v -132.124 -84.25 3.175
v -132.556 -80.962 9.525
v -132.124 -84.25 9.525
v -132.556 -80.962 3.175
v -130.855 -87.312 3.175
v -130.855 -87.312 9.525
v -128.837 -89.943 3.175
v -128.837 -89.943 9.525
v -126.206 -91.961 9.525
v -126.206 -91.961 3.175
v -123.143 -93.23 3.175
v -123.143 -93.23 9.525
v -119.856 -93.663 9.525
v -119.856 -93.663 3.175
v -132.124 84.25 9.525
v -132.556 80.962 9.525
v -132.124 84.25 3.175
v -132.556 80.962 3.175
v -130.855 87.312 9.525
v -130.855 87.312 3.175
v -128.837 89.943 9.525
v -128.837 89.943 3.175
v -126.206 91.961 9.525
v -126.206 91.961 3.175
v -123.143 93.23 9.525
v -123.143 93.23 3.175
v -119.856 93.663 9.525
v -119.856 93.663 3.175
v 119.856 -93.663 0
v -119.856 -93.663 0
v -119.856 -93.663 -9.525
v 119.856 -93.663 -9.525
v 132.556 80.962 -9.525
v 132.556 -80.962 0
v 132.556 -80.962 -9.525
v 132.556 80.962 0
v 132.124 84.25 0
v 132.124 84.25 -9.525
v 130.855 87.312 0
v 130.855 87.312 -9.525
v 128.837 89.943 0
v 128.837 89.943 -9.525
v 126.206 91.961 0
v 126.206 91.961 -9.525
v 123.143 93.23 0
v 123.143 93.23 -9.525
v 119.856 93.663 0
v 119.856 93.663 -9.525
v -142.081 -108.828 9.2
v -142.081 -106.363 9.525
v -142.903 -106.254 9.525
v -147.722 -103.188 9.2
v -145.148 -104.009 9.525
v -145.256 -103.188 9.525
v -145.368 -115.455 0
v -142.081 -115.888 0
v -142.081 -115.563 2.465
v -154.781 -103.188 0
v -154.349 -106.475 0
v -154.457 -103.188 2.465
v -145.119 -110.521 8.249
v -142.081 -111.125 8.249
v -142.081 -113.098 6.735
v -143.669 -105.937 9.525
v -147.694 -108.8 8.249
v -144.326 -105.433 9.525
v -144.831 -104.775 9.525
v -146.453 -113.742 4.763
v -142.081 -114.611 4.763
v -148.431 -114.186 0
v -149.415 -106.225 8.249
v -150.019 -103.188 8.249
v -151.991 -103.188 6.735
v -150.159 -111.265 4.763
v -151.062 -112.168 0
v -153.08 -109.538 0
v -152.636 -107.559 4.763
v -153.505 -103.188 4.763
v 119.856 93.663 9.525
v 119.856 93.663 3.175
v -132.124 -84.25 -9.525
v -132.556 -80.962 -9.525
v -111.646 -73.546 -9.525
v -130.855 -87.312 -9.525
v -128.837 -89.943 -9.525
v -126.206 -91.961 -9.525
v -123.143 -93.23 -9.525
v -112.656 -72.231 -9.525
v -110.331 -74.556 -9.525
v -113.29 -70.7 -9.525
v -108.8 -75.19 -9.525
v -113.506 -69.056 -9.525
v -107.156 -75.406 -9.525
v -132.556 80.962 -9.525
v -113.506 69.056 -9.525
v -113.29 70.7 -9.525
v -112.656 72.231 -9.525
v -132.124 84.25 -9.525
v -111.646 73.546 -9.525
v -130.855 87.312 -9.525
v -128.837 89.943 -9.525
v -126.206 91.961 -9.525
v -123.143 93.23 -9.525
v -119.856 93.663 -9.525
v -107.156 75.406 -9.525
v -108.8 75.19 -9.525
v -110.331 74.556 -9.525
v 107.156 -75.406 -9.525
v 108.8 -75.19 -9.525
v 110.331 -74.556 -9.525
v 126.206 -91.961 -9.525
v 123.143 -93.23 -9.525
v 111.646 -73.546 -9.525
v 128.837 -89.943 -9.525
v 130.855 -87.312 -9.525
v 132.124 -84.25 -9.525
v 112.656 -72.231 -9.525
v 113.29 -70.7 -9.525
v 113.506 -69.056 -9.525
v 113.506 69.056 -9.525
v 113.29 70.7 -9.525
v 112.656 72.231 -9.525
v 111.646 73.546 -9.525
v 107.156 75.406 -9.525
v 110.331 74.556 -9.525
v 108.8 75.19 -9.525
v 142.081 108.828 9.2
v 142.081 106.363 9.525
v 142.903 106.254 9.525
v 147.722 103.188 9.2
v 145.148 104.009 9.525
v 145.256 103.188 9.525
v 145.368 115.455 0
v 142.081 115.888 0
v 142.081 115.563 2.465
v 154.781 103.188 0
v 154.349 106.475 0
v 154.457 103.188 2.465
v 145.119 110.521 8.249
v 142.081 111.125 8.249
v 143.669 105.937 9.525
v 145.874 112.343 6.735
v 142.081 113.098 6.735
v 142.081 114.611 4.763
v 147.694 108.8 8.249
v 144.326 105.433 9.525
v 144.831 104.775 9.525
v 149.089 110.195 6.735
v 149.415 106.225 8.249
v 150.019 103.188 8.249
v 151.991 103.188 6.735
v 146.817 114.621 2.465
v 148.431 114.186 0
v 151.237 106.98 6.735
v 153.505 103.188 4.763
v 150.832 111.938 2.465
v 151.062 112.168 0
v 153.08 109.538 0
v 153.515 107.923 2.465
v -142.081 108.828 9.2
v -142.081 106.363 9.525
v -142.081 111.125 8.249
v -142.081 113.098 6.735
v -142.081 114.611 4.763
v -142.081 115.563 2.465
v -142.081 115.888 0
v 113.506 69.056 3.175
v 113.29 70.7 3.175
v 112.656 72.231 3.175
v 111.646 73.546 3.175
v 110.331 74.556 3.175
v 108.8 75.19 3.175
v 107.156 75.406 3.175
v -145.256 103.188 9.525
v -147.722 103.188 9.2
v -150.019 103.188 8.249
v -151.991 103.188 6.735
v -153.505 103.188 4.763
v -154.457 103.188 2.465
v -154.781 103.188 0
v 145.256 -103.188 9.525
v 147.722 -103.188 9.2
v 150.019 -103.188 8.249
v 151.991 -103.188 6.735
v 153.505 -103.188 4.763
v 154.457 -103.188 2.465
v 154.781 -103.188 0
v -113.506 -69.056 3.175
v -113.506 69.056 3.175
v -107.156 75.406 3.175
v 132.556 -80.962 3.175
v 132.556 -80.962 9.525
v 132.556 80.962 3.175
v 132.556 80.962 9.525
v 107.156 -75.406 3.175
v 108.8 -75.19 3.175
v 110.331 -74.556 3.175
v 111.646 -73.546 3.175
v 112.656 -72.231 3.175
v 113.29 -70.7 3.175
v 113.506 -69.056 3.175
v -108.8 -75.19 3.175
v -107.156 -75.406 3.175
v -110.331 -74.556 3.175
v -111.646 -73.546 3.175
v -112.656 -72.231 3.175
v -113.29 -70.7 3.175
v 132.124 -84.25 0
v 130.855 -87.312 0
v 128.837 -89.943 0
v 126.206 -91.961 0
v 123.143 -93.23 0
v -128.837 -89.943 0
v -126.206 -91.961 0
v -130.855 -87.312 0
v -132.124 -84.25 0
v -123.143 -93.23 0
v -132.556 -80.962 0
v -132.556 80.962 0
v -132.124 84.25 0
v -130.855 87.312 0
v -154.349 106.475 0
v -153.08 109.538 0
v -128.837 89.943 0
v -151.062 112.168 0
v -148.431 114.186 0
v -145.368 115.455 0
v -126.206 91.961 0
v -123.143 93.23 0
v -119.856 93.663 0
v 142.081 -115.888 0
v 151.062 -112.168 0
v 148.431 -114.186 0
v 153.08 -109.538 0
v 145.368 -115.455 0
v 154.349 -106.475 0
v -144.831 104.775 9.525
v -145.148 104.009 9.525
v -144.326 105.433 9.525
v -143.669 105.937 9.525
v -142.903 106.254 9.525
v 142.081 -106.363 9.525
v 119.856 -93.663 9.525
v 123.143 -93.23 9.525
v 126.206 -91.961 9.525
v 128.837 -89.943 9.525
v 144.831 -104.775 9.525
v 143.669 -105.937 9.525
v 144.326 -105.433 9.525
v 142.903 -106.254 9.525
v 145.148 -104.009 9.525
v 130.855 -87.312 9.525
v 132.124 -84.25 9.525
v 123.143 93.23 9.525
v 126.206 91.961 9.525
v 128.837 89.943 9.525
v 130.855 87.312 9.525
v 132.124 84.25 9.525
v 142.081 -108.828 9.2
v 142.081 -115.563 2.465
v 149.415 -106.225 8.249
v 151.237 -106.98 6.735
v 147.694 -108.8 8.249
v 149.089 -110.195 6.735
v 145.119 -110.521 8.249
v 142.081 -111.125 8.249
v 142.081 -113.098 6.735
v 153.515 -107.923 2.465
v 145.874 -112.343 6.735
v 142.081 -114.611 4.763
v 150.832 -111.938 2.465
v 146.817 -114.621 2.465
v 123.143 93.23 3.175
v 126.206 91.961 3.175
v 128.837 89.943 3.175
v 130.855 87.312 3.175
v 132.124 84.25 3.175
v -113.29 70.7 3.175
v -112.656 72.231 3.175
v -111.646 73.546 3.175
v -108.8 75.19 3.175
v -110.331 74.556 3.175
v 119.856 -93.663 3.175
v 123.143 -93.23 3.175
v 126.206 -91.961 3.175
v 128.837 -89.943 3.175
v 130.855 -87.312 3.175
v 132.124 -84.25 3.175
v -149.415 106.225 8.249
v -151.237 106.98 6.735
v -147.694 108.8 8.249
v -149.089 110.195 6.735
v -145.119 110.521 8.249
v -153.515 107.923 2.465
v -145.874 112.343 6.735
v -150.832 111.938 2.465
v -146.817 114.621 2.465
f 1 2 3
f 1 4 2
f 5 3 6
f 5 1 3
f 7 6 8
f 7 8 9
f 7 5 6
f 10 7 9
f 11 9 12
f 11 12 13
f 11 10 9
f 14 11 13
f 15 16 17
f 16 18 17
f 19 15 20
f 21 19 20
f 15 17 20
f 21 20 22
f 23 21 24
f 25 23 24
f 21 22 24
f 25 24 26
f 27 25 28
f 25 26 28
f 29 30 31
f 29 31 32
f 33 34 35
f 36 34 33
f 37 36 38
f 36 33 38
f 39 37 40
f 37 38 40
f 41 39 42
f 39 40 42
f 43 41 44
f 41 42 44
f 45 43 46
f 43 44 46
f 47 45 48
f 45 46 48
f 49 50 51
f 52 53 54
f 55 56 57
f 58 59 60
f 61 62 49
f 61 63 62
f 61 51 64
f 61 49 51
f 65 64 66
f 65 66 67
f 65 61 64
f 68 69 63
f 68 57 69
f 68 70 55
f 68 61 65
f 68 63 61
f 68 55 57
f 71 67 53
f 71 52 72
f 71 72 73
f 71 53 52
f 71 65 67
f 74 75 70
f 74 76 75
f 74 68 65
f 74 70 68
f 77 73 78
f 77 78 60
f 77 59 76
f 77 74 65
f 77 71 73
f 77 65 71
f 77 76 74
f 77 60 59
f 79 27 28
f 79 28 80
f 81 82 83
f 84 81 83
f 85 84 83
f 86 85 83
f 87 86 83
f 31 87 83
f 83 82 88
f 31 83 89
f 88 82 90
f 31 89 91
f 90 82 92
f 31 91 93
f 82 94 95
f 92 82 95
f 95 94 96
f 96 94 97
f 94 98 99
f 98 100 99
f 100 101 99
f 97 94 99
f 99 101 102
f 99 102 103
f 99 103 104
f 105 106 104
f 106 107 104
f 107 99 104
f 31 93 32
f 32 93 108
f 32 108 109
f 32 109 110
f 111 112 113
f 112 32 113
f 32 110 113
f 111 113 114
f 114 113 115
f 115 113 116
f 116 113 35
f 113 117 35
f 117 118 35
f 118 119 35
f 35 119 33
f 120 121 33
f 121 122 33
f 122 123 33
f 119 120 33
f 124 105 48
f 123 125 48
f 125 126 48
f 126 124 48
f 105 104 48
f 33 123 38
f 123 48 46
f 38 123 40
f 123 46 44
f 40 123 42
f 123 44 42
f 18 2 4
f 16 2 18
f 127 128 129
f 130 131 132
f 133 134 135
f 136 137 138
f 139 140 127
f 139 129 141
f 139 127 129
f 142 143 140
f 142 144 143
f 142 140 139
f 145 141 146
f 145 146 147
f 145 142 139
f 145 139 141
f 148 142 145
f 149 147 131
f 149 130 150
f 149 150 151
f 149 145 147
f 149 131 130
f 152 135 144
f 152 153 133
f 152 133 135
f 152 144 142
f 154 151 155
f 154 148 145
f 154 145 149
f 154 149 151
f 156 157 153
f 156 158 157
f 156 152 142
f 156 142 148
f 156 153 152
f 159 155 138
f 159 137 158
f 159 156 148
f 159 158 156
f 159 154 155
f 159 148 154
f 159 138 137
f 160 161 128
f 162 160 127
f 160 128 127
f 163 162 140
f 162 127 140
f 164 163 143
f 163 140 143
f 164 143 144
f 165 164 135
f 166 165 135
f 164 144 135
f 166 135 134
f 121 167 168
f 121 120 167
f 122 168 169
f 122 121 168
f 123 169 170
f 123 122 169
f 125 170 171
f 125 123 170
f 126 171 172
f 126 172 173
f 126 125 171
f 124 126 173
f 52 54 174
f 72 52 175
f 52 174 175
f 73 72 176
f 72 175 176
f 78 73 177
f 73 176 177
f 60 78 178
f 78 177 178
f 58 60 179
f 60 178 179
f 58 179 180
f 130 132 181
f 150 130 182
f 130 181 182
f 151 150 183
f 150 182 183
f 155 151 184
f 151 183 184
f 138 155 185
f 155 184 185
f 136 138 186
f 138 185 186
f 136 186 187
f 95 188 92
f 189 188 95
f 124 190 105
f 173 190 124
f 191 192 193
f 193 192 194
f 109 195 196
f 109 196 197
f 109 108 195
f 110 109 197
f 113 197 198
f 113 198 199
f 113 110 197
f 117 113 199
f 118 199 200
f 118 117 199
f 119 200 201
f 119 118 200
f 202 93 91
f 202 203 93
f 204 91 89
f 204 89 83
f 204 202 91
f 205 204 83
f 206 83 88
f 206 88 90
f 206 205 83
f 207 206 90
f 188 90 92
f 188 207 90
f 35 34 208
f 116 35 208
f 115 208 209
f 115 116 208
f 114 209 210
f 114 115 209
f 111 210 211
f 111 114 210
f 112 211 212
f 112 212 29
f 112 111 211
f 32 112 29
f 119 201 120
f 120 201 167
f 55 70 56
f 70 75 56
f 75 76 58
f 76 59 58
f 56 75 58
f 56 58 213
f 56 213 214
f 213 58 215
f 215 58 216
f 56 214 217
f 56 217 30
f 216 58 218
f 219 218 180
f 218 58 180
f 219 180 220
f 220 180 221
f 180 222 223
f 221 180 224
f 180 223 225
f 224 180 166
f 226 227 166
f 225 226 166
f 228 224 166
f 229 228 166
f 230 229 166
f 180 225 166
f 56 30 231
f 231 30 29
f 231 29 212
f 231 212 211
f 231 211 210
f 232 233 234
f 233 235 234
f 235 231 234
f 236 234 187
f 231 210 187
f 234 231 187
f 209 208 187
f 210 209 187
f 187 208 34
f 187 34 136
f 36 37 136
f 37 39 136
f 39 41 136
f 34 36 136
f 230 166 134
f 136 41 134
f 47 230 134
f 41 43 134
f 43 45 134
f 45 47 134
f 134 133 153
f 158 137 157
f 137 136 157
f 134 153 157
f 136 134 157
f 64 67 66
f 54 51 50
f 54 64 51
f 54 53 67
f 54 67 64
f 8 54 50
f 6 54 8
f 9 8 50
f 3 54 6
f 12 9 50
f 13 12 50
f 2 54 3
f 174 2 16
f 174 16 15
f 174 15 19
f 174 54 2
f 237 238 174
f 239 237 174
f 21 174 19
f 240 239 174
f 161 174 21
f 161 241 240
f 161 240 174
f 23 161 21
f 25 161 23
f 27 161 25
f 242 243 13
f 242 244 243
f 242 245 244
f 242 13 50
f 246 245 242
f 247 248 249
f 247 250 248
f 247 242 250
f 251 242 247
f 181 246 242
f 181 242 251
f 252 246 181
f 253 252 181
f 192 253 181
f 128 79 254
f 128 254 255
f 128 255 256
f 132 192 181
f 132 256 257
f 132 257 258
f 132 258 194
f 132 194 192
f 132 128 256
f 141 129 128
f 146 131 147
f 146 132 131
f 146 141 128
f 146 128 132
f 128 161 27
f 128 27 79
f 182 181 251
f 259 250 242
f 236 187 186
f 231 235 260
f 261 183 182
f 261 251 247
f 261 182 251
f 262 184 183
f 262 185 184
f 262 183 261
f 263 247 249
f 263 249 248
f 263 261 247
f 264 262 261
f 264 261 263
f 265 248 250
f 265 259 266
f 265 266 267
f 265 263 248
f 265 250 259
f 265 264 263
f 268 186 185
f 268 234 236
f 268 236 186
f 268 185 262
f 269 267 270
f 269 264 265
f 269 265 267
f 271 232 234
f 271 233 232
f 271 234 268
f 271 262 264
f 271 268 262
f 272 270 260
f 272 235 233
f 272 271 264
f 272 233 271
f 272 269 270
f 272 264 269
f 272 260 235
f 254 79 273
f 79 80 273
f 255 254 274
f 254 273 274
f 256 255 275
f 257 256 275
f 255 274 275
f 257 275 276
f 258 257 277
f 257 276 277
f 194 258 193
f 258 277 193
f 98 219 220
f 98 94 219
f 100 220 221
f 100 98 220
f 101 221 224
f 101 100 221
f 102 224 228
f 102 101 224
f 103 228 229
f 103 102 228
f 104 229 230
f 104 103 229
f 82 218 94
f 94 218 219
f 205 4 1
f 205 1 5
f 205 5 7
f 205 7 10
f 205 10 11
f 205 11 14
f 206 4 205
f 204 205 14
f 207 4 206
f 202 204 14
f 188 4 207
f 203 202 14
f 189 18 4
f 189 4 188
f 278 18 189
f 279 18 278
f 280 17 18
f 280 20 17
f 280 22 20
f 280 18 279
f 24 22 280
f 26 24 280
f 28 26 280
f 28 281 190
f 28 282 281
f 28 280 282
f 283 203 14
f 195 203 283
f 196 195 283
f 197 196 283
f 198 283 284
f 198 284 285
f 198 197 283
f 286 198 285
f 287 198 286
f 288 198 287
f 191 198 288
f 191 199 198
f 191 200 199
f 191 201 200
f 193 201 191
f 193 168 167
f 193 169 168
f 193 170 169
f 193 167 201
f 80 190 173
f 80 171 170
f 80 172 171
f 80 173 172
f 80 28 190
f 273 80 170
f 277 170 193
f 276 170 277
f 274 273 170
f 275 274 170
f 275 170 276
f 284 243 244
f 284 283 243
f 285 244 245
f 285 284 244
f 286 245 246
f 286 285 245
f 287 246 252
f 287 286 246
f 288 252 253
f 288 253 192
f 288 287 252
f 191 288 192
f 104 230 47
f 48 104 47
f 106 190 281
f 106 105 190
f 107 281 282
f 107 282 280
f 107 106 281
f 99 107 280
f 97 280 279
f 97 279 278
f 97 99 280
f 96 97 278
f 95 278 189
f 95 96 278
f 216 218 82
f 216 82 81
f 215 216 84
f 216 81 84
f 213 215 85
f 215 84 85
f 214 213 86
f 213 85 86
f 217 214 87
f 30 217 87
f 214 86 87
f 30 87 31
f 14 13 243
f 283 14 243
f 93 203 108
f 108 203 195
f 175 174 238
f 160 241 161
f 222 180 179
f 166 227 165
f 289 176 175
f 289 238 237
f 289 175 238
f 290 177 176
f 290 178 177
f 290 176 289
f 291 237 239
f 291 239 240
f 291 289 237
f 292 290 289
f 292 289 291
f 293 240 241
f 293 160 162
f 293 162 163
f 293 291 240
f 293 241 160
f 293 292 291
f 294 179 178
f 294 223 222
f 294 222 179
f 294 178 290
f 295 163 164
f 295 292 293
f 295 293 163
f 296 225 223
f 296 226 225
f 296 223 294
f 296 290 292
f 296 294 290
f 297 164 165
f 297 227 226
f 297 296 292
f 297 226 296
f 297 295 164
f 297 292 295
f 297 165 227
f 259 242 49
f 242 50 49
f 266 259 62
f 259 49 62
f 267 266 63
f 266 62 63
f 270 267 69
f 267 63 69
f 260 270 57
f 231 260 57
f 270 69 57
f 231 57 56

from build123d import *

# Parameters (mm, degrees)
SKETCH1_W           = 309.5625
SKETCH1_H           = 231.775
SKETCH1_W_2         = 265.1125
SKETCH1_H_2         = 187.325
SKETCH1_W_3         = 227.0125
SKETCH1_H_3         = 150.8125
BOSS_EXTRUDE1_DEPTH = 9.525
SKETCH1_3_W         = 265.1125
SKETCH1_3_H         = 187.325
SKETCH1_3_W_2       = 227.0125
SKETCH1_3_H_2       = 150.8125
BOSS_EXTRUDE2_DEPTH = 9.525
FILLET1_R           = 12.7
CUT_EXTRUDE1_START  = 9.525
SKETCH1_4_W         = 265.1125
SKETCH1_4_H         = 187.325
SKETCH1_4_W_2       = 227.0125
SKETCH1_4_H_2       = 150.8125
CUT_EXTRUDE1_DEPTH  = 6.35
FILLET2_R           = 6.35
FILLET3_R           = 12.7
FILLET4_R           = 9.525


with BuildPart() as part:
    # Sketch1 → Boss-Extrude1 (new body)
    # profile 1 of 2: a face of its own
    with BuildSketch(Plane.XY):
        Rectangle(SKETCH1_W, SKETCH1_H)
        Rectangle(SKETCH1_W_2, SKETCH1_H_2, mode=Mode.SUBTRACT)
    # profile 2 of 2: a face of its own
    with BuildSketch(Plane.XY):
        Rectangle(SKETCH1_W_2, SKETCH1_H_2)
        Rectangle(SKETCH1_W_3, SKETCH1_H_3, mode=Mode.SUBTRACT)
    extrude(amount=BOSS_EXTRUDE1_DEPTH)

    # Sketch1<3> → Boss-Extrude2 (add)
    with BuildSketch(Plane.XY):
        Rectangle(SKETCH1_3_W, SKETCH1_3_H)
        Rectangle(SKETCH1_3_W_2, SKETCH1_3_H_2, mode=Mode.SUBTRACT)
    extrude(amount=-BOSS_EXTRUDE2_DEPTH)

    # Fillet1
    fillet1_edges = [part.edges().sort_by_distance(p)[0] for p in [
        (-154.78125, -115.8875, 4.7625),
        (-154.78125, 115.8875, 4.7625),
        (154.78125, 115.8875, 4.7625),
        (154.78125, -115.8875, 4.7625),
        (132.55625, -93.6625, -4.7625),
        (-132.55625, -93.6625, -4.7625),
        (-132.55625, 93.6625, -4.7625),
        (132.55625, 93.6625, -4.7625),
    ]]
    fillet(fillet1_edges, radius=FILLET1_R)

    # Sketch1<4> → Cut-Extrude1 (cut)
    with BuildSketch(Plane.XY.offset(CUT_EXTRUDE1_START)):
        Rectangle(SKETCH1_4_W, SKETCH1_4_H)
        Rectangle(SKETCH1_4_W_2, SKETCH1_4_H_2, mode=Mode.SUBTRACT)
    extrude(amount=-CUT_EXTRUDE1_DEPTH, mode=Mode.SUBTRACT)

    # Fillet2
    fillet2_edges = [part.edges().sort_by_distance(p)[0] for p in [
        (-113.50625, 75.40625, -3.175),
        (113.50625, 75.40625, -3.175),
        (-113.50625, -75.40625, -3.175),
        (113.50625, -75.40625, -3.175),
    ]]
    fillet(fillet2_edges, radius=FILLET2_R)

    # Fillet3
    fillet3_edges = [part.edges().sort_by_distance(p)[0] for p in [
        (-132.55625, -93.6625, 6.35),
        (-132.55625, 93.6625, 6.35),
        (132.55625, 93.6625, 6.35),
        (132.55625, -93.6625, 6.35),
    ]]
    fillet(fillet3_edges, radius=FILLET3_R)

    # Fillet4
    fillet4_edges = [part.edges().sort_by_distance(p)[0] for p in [
        (-151.061506121, -112.167756121, 9.525),
        (0, -115.8875, 9.525),
        (151.061506121, -112.167756121, 9.525),
        (154.78125, 0, 9.525),
        (151.061506121, 112.167756121, 9.525),
        (0, 115.8875, 9.525),
        (-151.061506121, 112.167756121, 9.525),
        (-154.78125, 0, 9.525),
    ]]
    fillet(fillet4_edges, radius=FILLET4_R - 0.0001)  # a hair under: the kernel refuses the full size


solid = part.part
